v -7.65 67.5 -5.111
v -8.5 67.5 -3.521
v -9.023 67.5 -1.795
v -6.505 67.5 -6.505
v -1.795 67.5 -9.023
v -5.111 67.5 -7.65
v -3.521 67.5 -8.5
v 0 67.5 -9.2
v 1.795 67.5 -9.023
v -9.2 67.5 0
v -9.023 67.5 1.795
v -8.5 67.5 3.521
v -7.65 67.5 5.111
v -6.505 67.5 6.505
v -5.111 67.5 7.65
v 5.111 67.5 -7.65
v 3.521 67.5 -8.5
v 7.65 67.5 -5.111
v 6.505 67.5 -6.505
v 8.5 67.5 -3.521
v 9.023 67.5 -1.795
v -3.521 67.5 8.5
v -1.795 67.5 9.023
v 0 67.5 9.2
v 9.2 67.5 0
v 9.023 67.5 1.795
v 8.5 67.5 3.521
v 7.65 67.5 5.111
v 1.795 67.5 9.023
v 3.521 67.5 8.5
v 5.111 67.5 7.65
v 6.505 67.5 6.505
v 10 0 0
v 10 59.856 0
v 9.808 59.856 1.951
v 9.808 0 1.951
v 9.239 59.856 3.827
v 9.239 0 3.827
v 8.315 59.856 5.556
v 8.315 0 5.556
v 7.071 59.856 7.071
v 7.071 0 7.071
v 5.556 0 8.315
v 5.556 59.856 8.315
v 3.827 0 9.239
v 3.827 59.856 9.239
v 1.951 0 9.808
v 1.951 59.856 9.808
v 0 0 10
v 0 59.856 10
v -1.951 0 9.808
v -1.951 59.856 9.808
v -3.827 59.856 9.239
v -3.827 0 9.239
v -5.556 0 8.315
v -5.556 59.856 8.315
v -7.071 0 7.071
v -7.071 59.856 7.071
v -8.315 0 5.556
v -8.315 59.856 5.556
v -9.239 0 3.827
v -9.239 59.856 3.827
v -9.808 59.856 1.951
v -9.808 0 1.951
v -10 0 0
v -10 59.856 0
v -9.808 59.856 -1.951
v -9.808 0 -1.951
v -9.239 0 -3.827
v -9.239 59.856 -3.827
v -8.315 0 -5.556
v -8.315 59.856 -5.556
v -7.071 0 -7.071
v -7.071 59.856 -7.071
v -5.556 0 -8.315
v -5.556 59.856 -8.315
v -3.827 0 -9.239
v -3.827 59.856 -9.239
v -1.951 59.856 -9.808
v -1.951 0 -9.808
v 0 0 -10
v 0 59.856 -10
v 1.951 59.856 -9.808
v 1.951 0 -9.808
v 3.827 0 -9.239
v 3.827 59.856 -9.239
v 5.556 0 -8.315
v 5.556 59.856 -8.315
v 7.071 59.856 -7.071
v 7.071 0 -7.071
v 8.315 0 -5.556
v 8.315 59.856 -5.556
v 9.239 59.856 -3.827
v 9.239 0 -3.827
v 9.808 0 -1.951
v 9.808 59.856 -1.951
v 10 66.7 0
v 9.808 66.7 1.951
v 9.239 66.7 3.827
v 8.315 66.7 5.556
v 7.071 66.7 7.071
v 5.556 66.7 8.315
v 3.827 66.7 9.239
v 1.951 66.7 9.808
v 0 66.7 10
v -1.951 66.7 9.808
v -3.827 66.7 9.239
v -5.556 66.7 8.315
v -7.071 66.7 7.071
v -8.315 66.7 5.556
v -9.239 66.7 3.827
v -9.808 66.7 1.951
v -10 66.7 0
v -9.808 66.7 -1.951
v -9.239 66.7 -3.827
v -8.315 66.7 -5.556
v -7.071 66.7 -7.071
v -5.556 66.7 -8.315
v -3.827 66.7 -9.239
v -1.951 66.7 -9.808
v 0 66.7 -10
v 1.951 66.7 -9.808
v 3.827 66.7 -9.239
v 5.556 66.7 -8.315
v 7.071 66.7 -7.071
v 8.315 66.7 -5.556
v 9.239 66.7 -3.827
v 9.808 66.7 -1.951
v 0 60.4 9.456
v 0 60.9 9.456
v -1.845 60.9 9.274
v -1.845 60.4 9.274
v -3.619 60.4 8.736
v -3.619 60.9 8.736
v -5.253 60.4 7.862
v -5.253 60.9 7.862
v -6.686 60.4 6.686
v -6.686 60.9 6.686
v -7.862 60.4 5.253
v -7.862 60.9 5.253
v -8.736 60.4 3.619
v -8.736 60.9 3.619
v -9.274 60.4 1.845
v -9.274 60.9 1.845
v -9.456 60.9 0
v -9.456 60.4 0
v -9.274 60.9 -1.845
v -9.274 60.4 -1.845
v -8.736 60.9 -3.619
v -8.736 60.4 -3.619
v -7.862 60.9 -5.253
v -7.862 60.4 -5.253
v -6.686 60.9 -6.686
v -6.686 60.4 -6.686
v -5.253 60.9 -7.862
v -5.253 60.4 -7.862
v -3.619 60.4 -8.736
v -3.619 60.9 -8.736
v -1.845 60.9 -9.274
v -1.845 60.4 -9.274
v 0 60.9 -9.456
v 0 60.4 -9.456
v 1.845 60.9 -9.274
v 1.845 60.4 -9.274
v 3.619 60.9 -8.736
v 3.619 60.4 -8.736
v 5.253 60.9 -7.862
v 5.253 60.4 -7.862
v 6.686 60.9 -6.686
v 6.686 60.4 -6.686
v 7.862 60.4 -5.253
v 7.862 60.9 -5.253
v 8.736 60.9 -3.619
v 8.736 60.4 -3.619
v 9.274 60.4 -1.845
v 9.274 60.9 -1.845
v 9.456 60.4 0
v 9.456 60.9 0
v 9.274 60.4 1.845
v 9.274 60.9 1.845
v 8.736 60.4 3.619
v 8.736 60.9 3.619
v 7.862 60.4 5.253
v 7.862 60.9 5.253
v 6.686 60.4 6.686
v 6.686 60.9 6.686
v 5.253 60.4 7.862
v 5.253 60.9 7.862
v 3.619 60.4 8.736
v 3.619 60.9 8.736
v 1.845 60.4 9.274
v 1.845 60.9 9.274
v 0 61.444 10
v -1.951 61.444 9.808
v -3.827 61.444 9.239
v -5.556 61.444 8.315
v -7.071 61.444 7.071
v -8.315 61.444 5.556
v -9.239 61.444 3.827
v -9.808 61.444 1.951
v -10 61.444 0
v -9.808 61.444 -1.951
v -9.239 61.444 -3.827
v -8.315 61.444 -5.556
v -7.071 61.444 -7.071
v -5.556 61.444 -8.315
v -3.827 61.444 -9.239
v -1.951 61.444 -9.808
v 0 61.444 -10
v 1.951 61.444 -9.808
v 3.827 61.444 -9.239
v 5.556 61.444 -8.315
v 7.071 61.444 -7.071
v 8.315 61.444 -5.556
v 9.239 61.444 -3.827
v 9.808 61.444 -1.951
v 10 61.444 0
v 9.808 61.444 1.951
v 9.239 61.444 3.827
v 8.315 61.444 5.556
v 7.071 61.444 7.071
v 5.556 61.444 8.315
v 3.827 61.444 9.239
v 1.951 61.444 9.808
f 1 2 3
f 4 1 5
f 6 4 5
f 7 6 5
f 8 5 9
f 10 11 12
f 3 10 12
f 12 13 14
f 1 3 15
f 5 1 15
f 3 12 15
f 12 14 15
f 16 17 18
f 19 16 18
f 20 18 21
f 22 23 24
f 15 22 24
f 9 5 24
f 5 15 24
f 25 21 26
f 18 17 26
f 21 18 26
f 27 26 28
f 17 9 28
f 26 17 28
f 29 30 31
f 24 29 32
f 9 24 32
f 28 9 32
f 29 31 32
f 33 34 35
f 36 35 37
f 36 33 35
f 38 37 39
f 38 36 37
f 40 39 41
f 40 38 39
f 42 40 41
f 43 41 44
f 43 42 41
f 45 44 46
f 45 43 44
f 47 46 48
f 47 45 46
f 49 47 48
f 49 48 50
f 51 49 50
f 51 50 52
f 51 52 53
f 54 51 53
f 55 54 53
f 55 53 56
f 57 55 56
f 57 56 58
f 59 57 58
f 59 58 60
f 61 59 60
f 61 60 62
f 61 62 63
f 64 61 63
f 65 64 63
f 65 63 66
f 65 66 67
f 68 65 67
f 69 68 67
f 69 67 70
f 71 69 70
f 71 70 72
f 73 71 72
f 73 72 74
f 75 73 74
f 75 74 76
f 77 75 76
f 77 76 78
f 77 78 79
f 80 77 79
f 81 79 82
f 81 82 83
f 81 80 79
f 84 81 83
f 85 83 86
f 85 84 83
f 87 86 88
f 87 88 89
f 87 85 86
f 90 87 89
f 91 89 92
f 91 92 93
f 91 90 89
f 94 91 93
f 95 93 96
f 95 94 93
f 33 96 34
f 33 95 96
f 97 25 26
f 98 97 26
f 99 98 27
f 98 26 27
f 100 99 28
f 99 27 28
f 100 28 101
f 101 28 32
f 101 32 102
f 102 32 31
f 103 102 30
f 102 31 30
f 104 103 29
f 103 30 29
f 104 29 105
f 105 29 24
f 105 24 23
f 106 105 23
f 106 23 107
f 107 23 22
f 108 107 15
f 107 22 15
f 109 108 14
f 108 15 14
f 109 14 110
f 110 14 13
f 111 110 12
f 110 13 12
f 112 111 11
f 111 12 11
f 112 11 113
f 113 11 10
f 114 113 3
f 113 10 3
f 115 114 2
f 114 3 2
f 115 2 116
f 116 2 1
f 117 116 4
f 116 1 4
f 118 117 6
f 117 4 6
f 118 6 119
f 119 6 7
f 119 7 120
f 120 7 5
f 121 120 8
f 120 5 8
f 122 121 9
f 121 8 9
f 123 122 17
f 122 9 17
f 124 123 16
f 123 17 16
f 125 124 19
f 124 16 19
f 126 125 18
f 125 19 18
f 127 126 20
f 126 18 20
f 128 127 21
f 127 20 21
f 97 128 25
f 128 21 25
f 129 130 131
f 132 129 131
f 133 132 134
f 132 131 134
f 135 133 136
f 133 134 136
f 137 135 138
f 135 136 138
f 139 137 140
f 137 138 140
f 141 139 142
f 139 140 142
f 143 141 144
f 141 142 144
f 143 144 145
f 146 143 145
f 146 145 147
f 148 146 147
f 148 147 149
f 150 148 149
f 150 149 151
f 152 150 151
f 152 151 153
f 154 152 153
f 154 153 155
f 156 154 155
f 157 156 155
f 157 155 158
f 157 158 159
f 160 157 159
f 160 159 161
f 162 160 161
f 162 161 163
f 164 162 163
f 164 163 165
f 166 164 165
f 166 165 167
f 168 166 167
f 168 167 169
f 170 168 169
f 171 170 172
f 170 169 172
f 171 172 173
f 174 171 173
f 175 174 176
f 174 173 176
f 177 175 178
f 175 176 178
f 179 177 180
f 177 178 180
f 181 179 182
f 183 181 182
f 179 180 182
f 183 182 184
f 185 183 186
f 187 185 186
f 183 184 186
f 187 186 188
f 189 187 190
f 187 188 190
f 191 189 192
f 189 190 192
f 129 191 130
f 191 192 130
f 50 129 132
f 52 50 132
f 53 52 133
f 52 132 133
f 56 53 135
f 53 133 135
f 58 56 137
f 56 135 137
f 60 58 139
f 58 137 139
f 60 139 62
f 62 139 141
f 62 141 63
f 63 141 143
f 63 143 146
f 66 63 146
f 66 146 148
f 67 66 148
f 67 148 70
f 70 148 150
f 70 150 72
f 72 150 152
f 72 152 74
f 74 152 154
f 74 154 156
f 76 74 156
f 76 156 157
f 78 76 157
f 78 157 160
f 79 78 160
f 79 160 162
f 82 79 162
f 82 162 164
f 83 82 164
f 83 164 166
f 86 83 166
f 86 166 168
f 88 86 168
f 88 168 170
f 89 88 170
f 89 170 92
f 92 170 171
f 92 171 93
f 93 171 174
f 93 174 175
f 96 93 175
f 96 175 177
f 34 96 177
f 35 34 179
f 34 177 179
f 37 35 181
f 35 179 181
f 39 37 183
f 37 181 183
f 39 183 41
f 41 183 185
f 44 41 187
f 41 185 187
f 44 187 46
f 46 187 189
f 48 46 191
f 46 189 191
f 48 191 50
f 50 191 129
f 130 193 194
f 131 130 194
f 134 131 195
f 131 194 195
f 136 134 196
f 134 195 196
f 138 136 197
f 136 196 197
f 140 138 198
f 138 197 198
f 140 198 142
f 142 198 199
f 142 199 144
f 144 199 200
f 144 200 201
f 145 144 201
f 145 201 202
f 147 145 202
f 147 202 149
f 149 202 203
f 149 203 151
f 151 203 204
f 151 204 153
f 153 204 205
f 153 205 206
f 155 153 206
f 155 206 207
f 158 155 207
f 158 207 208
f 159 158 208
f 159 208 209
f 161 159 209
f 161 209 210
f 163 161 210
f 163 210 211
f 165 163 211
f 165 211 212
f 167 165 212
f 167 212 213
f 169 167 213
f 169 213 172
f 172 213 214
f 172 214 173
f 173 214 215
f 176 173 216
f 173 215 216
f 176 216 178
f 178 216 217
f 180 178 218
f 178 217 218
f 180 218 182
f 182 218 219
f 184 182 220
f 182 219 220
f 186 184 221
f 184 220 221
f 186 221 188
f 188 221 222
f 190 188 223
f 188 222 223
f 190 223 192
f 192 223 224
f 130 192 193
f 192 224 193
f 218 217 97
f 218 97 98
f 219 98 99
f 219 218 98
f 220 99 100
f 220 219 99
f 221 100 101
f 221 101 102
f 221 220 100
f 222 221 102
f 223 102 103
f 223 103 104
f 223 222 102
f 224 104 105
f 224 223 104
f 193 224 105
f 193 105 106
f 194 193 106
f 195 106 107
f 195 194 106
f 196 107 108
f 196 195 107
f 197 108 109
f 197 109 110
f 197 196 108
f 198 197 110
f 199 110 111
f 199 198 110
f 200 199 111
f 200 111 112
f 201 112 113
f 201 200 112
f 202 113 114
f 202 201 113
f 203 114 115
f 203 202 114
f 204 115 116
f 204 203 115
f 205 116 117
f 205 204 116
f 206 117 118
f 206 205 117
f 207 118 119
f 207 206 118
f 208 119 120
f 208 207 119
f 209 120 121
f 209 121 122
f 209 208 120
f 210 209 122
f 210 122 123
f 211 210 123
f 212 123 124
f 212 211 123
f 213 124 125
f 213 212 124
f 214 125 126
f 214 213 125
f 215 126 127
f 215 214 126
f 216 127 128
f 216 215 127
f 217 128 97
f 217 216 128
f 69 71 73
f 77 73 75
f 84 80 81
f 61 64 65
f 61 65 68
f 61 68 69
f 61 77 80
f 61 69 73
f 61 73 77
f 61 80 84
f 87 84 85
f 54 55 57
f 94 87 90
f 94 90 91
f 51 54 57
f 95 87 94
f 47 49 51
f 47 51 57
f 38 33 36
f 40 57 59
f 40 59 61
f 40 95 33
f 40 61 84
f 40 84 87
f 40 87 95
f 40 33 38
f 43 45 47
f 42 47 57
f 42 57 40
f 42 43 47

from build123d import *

# Parameters (mm, degrees)
F0_R     = 10
F1_DEPTH = 67.5
F4_SIZE2 = 0.8
F4_SIZE  = 0.8


with BuildPart() as f1:
    # F0 (on Front) → F1 (new body)
    with BuildSketch(Plane.XZ):
        Circle(F0_R)
    extrude(amount=-F1_DEPTH)

    # F2 (on Right) → F3 (revolve, cut)
    with BuildSketch(Plane.YZ):
        Polygon((60.4, 9.455708), (60.9, 9.455708), (61.465685, 10.021394), (59.834315, 10.021394), align=None)
        Polygon((61.465685, -10.021394), (60.9, -9.455708), (60.4, -9.455708), (59.834315, -10.021394), align=None)
    revolve(axis=Axis((0, 0, 0), (0, -1, 0)), mode=Mode.SUBTRACT)

    # F4
    f4_edges = [f1.edges().sort_by_distance(p)[0] for p in [
        (-10, 67.5, 0),
    ]]
    chamfer(f4_edges, length=F4_SIZE, length2=F4_SIZE2)


solid = f1.part
